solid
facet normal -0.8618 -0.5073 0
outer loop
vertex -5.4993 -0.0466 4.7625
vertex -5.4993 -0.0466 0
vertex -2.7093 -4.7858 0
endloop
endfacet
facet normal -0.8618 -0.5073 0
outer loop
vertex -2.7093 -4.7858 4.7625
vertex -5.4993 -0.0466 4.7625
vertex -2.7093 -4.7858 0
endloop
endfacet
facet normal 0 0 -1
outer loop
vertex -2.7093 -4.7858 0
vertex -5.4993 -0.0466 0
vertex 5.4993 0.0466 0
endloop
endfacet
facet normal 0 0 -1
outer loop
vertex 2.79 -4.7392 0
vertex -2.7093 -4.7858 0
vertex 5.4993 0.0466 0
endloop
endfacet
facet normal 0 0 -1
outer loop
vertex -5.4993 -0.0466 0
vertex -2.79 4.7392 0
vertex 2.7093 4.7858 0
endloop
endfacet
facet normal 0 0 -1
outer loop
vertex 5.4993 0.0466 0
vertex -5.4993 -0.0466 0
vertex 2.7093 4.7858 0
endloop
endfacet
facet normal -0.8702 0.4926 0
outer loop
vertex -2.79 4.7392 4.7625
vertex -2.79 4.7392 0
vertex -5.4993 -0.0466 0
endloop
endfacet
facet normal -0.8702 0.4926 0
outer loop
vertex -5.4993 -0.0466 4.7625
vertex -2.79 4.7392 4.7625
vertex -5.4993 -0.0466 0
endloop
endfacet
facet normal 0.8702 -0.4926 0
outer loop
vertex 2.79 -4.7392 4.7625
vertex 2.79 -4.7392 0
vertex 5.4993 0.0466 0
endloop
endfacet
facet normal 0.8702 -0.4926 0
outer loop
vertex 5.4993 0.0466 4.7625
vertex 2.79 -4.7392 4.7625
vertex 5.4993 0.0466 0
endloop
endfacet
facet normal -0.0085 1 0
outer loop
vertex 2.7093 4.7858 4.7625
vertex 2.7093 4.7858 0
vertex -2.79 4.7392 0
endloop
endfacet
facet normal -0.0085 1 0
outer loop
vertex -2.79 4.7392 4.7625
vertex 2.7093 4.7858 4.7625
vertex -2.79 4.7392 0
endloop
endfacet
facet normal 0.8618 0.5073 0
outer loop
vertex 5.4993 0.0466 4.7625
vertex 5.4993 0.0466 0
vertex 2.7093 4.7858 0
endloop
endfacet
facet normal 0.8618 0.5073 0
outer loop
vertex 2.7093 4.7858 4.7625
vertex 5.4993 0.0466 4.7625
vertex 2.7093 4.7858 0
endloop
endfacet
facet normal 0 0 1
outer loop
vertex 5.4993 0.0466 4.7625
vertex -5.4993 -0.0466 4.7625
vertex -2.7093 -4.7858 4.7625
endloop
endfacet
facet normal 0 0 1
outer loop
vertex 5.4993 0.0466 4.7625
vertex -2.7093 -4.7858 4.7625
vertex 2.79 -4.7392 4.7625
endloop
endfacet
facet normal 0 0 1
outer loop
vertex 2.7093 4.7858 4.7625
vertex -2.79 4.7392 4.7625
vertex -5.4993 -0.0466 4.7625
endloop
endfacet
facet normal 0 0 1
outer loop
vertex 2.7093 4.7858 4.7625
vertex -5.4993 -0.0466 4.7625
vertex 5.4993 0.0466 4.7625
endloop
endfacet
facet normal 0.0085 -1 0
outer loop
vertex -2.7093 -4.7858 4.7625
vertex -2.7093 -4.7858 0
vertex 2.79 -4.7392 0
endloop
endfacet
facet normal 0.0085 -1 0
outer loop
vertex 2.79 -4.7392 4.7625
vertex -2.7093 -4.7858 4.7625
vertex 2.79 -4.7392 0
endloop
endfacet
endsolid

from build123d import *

# Parameters (mm, degrees)
F3_DEPTH = 4.7625
F5_DEPTH = 4.7625


# Not quite as in the source:
# - the program builds the solid bodies; features that only make, move or delete a surface that nothing else refers to are left out


with BuildPart() as f3:
    # F0 (on Top) → F3 (new body)
    with BuildSketch(Plane.XY):
        Polygon((-2.7899552341, 4.7392185946), (-5.499261314, -0.0465628108), (-2.70930608, -4.7857814054), (2.7899552341, -4.7392185946), (5.499261314, 0.0465628108), (2.70930608, 4.7857814054), align=None)
    extrude(amount=F3_DEPTH)


with BuildPart() as f5:
    # F0 (on Top) → F5 (new body)
    with BuildSketch(Plane.XY):
        Polygon((-2.7899552341, 4.7392185946), (-5.499261314, -0.0465628108), (-2.70930608, -4.7857814054), (2.7899552341, -4.7392185946), (5.499261314, 0.0465628108), (2.70930608, 4.7857814054), align=None)
    extrude(amount=F5_DEPTH)


solid = f5.part
